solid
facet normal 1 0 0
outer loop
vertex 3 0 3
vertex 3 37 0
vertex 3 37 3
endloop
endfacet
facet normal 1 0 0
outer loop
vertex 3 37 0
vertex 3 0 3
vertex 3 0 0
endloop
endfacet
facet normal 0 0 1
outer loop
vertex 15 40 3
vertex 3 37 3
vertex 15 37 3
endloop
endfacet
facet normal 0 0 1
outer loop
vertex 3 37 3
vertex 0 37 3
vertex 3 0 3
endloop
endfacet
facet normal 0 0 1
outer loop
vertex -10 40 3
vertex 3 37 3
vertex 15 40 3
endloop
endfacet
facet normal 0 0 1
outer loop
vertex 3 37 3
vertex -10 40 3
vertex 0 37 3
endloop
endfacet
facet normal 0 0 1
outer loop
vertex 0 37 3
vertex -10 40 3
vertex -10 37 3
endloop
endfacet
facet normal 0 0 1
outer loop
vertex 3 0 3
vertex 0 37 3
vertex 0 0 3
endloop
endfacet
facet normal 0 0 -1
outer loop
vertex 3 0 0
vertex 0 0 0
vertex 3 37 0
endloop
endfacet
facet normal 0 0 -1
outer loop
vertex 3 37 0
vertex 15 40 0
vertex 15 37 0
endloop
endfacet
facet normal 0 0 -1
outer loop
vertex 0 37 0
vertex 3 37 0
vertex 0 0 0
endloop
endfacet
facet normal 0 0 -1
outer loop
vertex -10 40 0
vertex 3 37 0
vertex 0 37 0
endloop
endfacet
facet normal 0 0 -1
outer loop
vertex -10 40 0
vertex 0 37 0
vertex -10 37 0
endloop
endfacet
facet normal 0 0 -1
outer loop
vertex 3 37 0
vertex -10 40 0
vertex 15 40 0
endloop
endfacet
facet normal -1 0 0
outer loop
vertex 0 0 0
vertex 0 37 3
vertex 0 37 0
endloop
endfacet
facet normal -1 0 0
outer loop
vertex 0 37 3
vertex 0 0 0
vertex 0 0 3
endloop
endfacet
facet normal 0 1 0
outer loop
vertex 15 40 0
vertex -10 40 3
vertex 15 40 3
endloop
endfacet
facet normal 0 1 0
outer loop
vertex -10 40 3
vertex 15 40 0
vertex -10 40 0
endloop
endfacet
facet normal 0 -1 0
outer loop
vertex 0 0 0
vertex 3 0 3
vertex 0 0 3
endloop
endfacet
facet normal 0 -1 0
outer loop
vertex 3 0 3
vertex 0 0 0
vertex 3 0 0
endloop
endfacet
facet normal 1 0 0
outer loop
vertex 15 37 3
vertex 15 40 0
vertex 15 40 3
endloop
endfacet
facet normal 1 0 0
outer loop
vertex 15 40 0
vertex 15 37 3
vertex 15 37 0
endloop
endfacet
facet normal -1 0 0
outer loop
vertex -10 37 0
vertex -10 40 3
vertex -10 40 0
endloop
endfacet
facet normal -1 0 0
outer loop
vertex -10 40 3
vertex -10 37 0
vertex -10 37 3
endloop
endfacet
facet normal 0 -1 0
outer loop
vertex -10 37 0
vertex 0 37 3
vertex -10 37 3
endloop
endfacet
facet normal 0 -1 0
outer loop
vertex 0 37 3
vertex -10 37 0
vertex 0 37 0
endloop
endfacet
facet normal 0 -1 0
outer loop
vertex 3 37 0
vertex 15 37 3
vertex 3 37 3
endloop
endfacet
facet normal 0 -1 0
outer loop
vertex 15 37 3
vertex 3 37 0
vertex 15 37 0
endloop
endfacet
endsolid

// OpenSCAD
//буква T
union(){ 
cube([3,40,3]);
 translate([-10,37,0]) cube([25,3,3]);
}
